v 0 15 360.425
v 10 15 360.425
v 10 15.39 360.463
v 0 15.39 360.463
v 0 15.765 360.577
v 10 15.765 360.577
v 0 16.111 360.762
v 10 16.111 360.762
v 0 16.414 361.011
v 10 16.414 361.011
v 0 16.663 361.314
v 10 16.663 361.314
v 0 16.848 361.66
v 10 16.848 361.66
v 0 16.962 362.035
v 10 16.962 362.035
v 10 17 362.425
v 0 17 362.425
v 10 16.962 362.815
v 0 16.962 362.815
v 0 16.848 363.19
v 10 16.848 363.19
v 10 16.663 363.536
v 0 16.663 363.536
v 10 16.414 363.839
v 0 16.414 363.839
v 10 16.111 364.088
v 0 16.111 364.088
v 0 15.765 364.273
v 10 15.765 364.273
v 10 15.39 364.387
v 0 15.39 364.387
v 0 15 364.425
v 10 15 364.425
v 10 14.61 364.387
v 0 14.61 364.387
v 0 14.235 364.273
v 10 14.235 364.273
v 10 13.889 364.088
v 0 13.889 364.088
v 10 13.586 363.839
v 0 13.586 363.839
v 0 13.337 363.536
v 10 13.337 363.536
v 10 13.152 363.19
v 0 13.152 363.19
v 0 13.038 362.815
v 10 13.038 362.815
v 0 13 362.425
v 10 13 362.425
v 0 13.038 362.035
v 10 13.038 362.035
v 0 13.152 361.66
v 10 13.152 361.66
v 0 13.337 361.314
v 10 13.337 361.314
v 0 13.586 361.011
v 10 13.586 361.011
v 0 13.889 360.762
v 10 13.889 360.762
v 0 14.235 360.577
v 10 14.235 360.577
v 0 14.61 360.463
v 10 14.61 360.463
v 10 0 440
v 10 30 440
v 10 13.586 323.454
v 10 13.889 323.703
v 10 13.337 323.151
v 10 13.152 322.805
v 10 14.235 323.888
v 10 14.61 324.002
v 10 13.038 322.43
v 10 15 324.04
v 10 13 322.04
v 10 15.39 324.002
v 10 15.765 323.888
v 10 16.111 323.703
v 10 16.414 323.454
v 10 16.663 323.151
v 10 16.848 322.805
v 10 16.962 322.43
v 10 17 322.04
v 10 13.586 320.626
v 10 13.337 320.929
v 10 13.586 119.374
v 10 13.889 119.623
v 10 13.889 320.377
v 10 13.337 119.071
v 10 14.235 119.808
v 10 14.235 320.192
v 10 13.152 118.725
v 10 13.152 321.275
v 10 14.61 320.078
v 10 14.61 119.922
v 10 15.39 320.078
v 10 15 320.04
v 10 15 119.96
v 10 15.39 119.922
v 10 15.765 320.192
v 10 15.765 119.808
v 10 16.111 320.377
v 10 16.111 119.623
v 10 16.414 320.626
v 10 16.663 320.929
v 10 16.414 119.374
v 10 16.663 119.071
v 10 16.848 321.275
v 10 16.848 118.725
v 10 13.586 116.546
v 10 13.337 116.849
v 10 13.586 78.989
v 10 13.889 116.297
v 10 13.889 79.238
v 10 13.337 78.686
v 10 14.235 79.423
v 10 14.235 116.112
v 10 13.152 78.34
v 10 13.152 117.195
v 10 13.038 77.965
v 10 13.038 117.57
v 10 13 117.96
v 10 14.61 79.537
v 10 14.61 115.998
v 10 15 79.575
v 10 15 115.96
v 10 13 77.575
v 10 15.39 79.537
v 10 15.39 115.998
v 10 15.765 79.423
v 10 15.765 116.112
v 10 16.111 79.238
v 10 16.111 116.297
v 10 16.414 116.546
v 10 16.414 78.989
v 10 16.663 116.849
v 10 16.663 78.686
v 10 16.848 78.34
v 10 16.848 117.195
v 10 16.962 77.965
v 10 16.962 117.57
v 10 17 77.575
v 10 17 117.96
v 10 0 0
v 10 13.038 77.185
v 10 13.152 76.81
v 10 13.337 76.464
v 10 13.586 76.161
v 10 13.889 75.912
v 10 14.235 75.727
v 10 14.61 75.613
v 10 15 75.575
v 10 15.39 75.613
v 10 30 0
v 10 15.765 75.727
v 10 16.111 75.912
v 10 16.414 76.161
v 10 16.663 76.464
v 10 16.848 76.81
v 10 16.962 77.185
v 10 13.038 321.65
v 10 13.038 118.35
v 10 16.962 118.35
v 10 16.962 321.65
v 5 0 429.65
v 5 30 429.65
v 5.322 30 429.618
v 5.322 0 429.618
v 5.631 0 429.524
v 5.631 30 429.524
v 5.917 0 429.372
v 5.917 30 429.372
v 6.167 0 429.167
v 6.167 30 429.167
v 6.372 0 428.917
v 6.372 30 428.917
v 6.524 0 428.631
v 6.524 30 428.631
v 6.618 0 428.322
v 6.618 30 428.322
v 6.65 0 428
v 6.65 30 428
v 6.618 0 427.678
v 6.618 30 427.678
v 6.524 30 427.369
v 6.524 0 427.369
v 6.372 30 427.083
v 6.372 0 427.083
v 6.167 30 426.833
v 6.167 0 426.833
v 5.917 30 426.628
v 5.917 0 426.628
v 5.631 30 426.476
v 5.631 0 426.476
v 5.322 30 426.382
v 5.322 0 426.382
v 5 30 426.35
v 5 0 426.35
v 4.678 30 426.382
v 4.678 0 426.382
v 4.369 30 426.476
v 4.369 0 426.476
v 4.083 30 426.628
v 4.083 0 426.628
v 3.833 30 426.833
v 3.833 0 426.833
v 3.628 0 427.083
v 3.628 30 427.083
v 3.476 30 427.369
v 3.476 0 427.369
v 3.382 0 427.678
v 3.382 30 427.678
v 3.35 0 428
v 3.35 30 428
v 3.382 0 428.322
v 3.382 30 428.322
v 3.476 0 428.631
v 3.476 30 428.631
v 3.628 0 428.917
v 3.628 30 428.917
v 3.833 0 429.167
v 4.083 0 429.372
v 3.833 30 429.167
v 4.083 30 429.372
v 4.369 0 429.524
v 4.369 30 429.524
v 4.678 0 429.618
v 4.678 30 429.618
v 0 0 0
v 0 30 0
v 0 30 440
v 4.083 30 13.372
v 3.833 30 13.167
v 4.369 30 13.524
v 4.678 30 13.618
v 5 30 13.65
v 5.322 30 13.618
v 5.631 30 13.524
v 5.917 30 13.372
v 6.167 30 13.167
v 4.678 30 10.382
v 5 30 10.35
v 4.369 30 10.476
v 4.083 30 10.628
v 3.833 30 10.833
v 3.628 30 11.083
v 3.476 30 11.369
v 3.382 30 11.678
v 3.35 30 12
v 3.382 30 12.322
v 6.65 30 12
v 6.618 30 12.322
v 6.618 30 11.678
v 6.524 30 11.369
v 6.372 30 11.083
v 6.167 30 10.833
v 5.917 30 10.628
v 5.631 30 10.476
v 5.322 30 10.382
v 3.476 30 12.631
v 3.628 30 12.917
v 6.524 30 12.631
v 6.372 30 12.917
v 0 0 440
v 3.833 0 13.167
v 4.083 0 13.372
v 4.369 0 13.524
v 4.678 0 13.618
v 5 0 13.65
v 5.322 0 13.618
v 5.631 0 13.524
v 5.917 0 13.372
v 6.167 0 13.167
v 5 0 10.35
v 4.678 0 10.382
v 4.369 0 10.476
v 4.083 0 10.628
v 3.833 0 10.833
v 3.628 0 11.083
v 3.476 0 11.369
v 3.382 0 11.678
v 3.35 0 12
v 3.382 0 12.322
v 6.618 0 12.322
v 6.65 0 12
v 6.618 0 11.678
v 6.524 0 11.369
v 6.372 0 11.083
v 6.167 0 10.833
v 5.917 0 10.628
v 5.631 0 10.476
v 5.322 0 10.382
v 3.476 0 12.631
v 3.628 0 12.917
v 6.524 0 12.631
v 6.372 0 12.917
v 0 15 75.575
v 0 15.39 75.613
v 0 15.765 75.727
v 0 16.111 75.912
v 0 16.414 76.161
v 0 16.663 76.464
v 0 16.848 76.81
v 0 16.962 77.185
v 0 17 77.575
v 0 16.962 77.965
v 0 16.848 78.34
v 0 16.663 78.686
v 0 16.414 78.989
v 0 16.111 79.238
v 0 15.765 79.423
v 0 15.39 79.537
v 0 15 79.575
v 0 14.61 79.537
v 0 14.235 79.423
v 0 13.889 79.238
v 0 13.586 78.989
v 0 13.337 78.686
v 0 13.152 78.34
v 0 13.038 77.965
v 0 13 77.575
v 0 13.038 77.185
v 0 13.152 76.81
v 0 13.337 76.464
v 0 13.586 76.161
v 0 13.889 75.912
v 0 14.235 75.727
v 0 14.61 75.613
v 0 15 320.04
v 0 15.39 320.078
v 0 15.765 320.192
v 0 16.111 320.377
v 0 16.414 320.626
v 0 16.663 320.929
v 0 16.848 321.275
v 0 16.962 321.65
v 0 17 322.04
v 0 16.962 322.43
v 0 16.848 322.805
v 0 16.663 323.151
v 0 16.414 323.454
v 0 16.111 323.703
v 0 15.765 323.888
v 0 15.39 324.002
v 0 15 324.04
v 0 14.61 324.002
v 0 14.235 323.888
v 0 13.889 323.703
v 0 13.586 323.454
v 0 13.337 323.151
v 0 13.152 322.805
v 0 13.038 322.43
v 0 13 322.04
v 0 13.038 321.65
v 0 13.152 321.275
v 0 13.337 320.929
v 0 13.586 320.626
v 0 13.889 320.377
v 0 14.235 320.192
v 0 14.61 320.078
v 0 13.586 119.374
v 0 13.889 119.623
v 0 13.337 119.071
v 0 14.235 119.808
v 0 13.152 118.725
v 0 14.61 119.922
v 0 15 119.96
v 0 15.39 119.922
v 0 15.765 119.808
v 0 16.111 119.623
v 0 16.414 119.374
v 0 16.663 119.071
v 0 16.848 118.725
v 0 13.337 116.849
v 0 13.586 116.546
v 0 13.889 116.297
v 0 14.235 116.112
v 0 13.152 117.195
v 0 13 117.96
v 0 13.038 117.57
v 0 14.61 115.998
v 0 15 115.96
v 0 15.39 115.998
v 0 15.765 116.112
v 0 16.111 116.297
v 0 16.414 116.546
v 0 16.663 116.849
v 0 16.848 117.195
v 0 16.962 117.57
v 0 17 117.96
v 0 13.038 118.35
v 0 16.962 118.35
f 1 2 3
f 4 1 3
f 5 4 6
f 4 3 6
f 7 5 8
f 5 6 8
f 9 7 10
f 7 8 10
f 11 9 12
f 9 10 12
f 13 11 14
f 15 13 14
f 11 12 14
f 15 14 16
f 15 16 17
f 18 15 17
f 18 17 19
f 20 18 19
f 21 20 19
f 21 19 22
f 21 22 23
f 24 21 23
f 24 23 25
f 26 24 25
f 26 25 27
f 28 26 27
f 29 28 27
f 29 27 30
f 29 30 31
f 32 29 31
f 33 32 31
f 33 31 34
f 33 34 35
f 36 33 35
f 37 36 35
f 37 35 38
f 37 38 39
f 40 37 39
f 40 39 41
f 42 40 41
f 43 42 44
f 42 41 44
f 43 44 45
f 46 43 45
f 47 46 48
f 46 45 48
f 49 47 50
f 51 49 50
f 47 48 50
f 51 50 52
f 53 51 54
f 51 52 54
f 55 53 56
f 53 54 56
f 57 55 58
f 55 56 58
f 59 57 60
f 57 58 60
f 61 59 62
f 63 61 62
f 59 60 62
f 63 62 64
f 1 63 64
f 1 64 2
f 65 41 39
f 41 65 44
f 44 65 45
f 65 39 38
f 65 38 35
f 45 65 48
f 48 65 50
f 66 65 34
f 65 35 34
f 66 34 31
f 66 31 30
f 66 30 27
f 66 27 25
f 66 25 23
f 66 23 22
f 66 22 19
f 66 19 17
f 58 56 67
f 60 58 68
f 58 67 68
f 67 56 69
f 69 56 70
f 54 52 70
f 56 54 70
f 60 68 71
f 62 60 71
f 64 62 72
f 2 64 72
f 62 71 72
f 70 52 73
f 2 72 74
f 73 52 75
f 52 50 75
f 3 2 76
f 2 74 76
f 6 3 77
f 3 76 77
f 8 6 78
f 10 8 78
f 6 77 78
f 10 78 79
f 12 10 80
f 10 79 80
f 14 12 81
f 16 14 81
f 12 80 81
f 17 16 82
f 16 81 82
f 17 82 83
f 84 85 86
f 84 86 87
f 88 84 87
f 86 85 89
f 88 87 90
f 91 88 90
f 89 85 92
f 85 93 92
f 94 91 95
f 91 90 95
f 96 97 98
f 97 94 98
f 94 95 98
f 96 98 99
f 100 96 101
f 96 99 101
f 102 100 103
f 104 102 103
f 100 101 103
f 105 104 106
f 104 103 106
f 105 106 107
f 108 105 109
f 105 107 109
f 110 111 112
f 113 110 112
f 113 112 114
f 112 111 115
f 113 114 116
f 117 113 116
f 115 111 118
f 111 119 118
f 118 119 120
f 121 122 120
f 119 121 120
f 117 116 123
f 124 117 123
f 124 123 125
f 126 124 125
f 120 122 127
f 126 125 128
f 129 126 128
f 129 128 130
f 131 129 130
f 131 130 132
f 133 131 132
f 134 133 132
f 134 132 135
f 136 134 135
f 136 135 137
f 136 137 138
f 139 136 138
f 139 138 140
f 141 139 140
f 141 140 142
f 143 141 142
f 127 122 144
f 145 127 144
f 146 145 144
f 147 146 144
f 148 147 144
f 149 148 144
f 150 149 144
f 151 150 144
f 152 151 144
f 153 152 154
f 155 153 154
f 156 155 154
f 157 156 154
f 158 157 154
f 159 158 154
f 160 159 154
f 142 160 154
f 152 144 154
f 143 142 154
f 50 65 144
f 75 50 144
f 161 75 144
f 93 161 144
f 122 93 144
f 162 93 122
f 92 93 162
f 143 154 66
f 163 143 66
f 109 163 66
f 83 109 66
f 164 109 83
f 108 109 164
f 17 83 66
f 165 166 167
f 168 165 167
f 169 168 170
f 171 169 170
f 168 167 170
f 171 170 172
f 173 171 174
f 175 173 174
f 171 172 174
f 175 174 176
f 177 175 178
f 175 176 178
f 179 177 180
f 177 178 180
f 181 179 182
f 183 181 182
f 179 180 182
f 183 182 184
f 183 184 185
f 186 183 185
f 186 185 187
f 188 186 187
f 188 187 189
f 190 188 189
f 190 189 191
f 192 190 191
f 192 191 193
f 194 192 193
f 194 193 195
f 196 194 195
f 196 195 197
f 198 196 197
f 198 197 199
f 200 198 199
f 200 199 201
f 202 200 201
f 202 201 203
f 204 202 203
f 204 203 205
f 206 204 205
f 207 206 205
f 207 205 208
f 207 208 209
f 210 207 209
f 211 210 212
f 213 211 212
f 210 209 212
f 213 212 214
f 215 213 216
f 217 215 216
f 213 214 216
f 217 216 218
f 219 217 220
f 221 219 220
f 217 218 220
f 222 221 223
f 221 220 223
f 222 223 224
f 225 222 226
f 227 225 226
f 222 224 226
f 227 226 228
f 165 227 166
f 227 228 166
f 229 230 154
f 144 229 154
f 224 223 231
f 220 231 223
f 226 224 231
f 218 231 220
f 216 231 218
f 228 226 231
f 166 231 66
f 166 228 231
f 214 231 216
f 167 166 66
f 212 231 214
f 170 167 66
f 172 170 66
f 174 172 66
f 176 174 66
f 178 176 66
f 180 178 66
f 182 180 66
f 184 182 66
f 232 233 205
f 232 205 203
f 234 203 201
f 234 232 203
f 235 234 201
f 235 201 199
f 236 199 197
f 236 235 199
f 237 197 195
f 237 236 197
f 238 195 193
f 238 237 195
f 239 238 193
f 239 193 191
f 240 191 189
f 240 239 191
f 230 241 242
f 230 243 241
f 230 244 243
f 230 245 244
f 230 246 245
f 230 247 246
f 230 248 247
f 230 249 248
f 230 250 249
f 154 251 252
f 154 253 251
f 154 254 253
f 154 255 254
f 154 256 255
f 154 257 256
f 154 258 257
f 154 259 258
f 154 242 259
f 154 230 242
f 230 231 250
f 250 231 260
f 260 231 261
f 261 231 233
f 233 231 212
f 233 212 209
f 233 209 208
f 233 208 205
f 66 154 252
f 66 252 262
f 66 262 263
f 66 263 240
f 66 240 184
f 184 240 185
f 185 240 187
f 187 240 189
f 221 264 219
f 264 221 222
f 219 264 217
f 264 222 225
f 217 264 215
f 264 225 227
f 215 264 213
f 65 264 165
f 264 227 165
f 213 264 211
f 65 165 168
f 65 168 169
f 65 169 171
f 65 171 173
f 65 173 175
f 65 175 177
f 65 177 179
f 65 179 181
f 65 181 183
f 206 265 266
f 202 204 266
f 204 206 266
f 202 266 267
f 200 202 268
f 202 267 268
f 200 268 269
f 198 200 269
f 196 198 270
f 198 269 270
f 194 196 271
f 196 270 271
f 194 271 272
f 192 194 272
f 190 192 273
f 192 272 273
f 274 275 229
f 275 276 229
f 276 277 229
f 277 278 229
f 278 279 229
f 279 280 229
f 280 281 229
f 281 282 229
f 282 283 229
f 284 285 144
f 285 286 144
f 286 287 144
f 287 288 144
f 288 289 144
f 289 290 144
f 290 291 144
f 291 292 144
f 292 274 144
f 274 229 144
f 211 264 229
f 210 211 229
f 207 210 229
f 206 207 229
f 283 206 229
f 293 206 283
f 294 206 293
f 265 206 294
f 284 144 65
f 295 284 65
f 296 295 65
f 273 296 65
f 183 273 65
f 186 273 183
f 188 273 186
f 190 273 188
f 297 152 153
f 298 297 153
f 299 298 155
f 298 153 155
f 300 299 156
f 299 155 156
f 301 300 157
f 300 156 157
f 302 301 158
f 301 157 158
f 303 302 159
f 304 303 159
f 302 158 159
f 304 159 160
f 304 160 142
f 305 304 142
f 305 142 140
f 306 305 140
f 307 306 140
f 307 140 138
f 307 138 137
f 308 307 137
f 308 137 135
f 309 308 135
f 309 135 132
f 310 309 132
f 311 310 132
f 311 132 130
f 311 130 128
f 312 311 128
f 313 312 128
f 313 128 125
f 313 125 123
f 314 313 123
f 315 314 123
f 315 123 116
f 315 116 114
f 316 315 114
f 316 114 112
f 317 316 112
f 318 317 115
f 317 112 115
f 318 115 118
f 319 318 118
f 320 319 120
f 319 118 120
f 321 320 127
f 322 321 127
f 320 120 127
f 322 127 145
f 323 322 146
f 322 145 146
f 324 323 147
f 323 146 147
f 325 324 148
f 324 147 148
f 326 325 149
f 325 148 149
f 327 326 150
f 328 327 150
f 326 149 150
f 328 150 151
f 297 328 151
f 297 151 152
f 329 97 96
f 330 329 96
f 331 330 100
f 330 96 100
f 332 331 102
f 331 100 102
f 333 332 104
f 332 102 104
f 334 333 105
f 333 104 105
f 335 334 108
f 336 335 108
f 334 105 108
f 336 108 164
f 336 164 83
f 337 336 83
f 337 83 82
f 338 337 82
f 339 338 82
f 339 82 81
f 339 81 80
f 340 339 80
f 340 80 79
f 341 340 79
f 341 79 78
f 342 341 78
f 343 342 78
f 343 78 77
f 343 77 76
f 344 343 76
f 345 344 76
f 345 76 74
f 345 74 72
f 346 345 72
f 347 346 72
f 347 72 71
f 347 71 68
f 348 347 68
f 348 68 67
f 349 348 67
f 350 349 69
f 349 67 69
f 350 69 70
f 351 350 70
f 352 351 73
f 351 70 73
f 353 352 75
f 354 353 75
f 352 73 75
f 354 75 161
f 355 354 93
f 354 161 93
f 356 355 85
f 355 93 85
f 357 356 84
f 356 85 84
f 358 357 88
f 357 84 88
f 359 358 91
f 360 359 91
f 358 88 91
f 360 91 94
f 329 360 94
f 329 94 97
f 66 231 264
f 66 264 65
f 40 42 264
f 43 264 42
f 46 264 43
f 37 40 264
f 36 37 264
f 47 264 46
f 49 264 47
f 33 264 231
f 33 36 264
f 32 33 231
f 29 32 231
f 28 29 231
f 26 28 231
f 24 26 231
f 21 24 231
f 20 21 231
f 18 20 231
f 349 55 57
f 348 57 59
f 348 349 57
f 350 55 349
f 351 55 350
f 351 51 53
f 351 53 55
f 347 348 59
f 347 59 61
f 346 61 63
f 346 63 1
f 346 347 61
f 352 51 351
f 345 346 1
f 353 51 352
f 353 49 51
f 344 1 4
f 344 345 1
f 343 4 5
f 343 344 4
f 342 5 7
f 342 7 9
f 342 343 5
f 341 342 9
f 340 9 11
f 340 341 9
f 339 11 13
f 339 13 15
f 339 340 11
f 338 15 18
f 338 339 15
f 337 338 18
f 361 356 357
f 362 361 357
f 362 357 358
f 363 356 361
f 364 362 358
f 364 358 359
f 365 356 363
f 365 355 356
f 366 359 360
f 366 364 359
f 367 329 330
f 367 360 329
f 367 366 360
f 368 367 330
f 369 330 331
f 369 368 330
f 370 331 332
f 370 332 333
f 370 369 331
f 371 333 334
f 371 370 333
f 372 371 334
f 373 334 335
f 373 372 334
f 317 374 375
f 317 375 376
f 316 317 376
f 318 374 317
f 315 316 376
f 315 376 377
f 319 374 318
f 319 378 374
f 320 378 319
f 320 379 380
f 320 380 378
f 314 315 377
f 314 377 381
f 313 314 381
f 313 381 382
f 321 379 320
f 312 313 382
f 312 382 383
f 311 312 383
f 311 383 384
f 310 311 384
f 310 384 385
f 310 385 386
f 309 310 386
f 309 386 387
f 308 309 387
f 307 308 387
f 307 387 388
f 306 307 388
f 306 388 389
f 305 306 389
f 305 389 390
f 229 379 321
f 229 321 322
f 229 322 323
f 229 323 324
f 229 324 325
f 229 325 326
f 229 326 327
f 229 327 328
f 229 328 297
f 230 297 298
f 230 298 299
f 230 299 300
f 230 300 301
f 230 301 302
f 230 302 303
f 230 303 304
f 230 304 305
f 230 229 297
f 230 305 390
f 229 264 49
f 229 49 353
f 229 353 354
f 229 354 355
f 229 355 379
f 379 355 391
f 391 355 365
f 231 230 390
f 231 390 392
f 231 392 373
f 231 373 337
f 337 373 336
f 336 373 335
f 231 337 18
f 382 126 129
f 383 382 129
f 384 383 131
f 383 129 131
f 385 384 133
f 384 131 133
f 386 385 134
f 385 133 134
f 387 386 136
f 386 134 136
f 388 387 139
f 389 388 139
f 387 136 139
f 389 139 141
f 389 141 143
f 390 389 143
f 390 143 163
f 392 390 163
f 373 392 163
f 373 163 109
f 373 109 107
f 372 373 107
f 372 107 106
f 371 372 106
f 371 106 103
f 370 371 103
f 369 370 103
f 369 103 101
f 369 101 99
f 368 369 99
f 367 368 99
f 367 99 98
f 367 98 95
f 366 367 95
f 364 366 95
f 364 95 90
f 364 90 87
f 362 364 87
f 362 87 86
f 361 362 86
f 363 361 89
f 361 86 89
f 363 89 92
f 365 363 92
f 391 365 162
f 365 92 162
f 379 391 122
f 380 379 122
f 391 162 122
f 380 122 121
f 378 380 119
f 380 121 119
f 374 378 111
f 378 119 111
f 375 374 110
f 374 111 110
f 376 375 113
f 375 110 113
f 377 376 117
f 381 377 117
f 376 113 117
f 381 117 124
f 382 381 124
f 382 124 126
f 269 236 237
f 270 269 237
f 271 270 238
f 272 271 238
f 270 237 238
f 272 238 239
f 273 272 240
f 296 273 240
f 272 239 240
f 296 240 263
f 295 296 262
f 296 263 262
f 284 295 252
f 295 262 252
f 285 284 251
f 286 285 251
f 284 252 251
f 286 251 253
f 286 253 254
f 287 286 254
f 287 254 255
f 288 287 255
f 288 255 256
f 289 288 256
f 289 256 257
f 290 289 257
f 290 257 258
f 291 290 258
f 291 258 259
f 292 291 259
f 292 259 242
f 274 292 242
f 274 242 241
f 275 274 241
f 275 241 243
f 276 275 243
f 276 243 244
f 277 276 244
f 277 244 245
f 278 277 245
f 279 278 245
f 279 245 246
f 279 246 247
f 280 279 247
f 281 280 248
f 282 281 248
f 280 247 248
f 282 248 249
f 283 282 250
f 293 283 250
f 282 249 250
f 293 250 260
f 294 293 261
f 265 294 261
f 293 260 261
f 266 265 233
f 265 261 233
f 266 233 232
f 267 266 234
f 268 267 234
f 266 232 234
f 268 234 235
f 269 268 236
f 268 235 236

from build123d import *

# Parameters (mm, degrees)
SKETCH1_W               = 10
SKETCH1_H               = 30
BOSS_EXTRUDE1_DEPTH     = 440
ESQUISSE1_R             = 1.65
ENL_V_MAT_EXTRU_1_DEPTH = 442.134900002
ESQUISSE2_R             = 2
ENL_V_MAT_EXTRU_2_DEPTH = 442.134900002


with BuildPart() as part:
    # Sketch1 → Boss-Extrude1 (new body)
    with BuildSketch(Plane.XY):
        with Locations((5, 15)):
            Rectangle(SKETCH1_W, SKETCH1_H)
    extrude(amount=BOSS_EXTRUDE1_DEPTH)

    # Esquisse1 → Enlèv. mat.-Extru.1 (cut, through all)
    with BuildSketch(Plane(origin=(0, 30, 0), x_dir=(1, 0, 0), z_dir=(0, 1, 0))):
        with Locations(Location((5, -428, 0), (0, 0, 270))):
            Circle(ESQUISSE1_R)
        with Locations(Location((5, -12, 0), (0, 0, 270))):
            Circle(ESQUISSE1_R)
    extrude(amount=-ENL_V_MAT_EXTRU_1_DEPTH, mode=Mode.SUBTRACT)

    # Esquisse2 → Enlèv. mat.-Extru.2 (cut, through all)
    with BuildSketch(Plane(origin=(10, 0, 0), x_dir=(0, 0, -1), z_dir=(1, 0, 0))):
        with Locations((-362.425, 15)):
            Circle(ESQUISSE2_R)
        with Locations((-77.575, 15)):
            Circle(ESQUISSE2_R)
        with Locations((-322.04, 15)):
            Circle(ESQUISSE2_R)
        with Locations((-117.96, 15)):
            Circle(ESQUISSE2_R)
    extrude(amount=-ENL_V_MAT_EXTRU_2_DEPTH, mode=Mode.SUBTRACT)


solid = part.part
